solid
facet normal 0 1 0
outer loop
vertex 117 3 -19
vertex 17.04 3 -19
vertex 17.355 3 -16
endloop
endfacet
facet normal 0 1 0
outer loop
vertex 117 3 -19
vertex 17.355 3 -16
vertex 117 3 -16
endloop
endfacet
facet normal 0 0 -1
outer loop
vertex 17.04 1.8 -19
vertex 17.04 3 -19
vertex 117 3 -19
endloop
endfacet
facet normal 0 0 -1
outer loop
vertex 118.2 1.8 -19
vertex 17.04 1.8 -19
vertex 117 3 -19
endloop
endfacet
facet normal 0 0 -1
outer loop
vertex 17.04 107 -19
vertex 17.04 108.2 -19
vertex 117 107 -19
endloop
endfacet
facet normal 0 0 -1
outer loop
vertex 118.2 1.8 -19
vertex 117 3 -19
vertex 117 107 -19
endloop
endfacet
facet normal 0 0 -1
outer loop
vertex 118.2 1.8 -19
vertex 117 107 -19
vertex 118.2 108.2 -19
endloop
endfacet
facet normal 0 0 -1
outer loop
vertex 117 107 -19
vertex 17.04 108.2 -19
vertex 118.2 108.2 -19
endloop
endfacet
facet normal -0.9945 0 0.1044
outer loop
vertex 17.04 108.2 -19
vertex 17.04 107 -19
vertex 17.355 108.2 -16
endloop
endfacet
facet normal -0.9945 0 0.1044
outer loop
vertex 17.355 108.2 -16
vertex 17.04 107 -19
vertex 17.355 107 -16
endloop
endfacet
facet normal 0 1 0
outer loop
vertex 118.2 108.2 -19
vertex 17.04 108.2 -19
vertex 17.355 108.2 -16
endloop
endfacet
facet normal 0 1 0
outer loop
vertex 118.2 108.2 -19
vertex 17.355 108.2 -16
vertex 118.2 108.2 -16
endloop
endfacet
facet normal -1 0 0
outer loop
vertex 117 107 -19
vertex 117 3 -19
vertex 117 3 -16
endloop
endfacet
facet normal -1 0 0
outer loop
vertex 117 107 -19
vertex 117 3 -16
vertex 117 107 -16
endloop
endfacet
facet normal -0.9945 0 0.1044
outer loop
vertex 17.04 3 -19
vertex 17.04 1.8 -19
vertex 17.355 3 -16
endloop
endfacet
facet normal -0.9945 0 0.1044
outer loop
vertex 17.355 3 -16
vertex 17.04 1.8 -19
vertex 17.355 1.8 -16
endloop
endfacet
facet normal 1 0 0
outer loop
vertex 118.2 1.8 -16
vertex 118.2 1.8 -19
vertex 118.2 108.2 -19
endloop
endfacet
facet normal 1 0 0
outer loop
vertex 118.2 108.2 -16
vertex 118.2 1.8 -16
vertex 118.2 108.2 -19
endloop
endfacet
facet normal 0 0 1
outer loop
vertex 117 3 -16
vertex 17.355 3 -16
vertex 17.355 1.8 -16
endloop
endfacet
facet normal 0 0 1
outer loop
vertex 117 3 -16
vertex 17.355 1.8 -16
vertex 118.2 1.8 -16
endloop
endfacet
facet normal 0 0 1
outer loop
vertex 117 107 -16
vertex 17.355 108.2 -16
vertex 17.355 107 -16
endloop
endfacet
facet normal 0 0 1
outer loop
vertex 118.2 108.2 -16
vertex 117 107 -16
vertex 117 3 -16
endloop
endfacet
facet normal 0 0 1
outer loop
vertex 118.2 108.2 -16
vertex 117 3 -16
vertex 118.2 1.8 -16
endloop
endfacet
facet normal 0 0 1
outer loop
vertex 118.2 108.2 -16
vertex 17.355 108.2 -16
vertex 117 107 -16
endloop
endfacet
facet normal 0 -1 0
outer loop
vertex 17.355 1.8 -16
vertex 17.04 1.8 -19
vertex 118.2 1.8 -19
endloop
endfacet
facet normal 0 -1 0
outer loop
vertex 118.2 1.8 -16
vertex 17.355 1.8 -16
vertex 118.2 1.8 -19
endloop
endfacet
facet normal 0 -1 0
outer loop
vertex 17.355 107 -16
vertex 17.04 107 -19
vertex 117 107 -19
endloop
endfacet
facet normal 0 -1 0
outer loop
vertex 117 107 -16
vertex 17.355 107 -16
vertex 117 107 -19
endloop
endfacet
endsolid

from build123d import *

# Parameters (mm, degrees)
PAD006_DEPTH = 110
BOX051_W     = 117
BOX051_H     = 104
BOX051_DEPTH = 3
BOX050_W     = 118.2
BOX050_H     = 106.4
BOX050_DEPTH = 3


with BuildPart() as body004:
    # CopySketch011 → Pad006 (new body)
    with BuildSketch(Plane(origin=(0, 0, -162), x_dir=(1, 0, 0), z_dir=(0, -1, 0))):
        Polygon((0, 0), (2.01, 0), (19.87772, 170), (0, 170), align=None)
    extrude(amount=-PAD006_DEPTH)


with BuildPart() as cube043:
    # Box051 → Box051 (new body)
    with BuildSketch(Plane(origin=(0, 1.2, 0), x_dir=(1, 0, 0), z_dir=(0, 0, 1))):
        with Locations((58.5, 52)):
            Rectangle(BOX051_W, BOX051_H)
    extrude(amount=BOX051_DEPTH)


with BuildPart() as deckel_rahmen_cut:
    # Box050 → Box050 (new body)
    with BuildSketch(Plane.XY):
        with Locations((59.1, 53.2)):
            Rectangle(BOX050_W, BOX050_H)
    extrude(amount=BOX050_DEPTH)

    # Cut050: cut Cube043
    add(cube043.part, mode=Mode.SUBTRACT)


with BuildPart() as deckel_rahmen_cut_1:
    # Cut050 placement: moved
    add(deckel_rahmen_cut.part.moved(Location((0, 1.8, -19))))

    # Cut051: cut Body004
    add(body004.part, mode=Mode.SUBTRACT)


solid = deckel_rahmen_cut_1.part
